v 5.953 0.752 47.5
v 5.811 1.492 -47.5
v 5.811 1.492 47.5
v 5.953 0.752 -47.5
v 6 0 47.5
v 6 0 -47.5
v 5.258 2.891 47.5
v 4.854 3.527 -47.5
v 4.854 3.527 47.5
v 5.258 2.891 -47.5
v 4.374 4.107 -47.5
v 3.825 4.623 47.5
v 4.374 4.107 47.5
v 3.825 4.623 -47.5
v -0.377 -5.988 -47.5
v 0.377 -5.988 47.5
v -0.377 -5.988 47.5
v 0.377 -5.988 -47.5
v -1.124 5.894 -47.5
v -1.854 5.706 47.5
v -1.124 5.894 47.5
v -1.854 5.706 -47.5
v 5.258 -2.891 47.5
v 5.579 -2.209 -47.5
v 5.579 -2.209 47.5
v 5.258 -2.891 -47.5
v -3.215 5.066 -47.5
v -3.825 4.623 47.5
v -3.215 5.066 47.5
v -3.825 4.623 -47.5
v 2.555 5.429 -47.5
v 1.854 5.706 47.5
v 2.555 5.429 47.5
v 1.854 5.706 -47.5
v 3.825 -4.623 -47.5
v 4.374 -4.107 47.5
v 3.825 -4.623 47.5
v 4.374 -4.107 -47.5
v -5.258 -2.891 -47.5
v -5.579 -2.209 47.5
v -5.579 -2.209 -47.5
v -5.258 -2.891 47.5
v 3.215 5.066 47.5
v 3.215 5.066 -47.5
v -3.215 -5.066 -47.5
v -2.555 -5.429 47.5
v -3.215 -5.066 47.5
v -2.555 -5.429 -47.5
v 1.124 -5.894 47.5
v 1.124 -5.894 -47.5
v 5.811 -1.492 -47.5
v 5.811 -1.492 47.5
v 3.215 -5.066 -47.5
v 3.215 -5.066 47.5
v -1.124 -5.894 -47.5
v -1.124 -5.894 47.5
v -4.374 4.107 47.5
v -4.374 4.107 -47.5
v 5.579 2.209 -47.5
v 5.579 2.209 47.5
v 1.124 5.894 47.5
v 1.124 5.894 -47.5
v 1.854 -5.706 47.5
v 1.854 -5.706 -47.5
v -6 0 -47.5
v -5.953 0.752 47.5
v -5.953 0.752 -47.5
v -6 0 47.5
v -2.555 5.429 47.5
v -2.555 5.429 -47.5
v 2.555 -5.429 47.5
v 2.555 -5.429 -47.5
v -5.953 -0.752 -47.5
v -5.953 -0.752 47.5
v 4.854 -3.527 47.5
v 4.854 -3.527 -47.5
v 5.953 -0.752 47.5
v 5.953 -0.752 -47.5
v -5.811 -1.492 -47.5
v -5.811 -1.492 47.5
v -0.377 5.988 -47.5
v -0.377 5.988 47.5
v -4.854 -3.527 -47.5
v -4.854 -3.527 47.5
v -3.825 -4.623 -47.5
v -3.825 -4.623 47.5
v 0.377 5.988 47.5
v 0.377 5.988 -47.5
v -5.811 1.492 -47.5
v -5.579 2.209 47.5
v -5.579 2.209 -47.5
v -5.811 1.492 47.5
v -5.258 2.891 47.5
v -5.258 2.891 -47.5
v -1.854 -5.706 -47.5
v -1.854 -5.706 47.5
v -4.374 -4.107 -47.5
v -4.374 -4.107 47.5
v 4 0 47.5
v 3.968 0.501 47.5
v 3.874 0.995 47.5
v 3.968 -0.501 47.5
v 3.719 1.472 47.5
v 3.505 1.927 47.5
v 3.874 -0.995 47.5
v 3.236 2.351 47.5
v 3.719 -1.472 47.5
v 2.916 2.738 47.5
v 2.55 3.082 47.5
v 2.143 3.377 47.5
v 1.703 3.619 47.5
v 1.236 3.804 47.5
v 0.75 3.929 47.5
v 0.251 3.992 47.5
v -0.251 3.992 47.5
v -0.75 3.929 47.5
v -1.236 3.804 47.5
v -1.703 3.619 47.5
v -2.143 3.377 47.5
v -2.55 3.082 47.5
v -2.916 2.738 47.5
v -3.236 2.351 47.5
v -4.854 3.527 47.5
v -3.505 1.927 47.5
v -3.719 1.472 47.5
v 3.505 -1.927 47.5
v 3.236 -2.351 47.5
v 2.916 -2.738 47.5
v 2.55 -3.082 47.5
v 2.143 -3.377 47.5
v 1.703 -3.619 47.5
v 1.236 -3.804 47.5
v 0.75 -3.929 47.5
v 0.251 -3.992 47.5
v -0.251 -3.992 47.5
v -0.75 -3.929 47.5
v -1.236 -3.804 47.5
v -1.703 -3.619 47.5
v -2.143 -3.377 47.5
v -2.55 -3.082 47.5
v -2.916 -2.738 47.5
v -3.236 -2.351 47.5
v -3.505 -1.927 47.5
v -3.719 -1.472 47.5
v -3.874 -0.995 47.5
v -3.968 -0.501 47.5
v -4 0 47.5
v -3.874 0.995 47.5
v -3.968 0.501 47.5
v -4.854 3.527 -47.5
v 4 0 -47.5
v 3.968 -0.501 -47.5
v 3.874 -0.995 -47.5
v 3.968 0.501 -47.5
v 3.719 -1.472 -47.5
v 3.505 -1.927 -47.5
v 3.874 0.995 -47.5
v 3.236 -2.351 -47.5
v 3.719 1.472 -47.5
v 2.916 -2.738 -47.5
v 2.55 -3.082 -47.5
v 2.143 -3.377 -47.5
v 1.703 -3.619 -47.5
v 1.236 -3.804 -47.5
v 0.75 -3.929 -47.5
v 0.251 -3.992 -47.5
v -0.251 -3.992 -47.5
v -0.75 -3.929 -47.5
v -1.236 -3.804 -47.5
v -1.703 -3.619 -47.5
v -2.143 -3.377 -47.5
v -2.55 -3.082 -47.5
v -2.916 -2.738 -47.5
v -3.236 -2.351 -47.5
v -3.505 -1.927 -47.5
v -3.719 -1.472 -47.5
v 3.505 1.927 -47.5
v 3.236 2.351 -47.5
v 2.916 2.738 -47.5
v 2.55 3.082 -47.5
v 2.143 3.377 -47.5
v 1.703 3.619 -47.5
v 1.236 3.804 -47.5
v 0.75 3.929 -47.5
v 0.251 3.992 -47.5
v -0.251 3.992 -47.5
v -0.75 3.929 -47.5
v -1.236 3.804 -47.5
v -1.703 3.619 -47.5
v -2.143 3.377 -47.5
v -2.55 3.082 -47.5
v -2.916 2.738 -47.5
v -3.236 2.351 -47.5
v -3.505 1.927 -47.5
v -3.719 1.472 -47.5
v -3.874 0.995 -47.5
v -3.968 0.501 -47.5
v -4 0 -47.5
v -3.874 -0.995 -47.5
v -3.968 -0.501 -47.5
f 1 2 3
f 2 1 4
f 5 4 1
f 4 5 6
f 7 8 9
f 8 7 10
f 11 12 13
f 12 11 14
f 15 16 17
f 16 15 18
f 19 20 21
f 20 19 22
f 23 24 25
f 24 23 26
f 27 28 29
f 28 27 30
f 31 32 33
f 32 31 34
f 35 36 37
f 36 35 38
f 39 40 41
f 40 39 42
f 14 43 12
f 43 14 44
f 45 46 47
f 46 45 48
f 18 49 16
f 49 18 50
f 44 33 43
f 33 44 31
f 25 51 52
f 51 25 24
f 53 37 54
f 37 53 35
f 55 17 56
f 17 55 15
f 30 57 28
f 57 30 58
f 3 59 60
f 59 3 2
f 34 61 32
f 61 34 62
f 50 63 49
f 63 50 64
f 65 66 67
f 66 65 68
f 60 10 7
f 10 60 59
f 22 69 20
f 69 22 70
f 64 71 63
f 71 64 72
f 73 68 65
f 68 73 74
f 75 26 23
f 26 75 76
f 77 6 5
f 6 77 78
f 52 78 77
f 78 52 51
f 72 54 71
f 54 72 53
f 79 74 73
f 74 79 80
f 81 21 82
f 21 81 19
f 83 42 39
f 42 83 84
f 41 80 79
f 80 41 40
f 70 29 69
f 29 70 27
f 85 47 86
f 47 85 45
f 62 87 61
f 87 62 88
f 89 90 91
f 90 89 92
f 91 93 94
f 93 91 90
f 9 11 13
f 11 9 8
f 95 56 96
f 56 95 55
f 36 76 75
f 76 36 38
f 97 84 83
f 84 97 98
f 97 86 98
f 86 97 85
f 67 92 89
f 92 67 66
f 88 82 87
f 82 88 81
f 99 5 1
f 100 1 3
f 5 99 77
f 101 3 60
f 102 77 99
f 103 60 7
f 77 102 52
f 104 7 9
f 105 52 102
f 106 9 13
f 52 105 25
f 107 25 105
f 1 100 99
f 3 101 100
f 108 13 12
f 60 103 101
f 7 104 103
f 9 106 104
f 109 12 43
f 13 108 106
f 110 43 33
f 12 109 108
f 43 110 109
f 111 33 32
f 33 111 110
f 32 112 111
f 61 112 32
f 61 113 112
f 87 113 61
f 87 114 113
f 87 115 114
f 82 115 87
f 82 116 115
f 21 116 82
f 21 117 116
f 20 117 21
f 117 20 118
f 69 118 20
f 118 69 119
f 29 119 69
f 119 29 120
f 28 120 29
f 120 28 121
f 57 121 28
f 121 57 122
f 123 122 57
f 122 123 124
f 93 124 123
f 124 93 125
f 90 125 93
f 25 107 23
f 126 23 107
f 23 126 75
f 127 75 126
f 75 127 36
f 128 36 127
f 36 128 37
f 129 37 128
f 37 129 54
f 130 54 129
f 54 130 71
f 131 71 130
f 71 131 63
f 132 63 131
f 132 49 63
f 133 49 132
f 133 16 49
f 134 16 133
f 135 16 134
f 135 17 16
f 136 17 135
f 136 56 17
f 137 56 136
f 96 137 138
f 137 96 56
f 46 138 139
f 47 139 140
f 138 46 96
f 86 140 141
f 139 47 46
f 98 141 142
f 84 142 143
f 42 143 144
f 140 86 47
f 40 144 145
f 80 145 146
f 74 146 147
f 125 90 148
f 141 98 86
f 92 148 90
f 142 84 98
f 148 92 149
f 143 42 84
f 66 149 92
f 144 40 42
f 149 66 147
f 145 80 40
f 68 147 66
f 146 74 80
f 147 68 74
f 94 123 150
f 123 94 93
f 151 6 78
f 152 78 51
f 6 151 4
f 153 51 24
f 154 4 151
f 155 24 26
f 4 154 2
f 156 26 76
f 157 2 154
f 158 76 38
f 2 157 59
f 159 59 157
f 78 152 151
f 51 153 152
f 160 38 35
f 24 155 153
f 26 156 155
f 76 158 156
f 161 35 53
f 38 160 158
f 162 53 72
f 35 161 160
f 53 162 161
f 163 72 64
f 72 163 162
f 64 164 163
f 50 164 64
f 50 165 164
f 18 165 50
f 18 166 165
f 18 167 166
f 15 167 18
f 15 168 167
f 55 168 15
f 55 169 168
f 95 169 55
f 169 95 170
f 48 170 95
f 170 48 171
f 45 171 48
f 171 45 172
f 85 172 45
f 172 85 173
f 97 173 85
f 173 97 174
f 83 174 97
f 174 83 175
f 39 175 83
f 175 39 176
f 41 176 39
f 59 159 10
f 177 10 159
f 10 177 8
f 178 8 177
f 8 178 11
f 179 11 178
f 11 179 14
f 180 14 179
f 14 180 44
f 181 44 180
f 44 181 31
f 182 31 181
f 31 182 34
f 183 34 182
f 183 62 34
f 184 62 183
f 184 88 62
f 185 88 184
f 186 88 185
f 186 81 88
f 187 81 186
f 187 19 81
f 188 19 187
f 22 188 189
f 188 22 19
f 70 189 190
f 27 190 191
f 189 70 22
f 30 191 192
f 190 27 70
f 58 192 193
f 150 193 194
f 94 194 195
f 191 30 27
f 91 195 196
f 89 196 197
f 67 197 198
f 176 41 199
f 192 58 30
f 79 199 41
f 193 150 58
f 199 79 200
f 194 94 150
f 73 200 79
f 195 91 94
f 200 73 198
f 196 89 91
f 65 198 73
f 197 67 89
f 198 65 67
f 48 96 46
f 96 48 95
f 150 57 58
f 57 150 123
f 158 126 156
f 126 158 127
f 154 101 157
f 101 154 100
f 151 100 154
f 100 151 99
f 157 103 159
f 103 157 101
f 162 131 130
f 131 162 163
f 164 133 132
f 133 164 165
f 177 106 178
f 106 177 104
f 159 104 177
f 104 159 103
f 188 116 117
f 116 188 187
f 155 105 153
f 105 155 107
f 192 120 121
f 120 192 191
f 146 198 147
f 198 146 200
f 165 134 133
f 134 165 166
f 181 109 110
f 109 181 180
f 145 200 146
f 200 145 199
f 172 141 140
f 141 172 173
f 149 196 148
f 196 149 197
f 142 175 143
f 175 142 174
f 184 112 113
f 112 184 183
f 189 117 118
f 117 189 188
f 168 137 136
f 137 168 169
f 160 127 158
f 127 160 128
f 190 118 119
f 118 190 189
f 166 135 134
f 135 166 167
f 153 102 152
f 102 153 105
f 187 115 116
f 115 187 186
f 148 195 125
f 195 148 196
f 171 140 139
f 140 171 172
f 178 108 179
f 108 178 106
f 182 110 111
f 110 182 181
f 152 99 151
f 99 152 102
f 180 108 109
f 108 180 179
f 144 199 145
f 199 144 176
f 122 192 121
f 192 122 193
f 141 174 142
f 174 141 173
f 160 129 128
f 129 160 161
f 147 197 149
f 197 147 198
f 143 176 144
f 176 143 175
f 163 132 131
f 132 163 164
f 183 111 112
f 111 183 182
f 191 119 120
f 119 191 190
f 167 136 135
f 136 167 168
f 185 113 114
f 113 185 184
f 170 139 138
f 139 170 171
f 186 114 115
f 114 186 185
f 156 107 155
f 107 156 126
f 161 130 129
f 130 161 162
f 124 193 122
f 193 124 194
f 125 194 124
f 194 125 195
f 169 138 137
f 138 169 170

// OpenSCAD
$fn = 50;


difference() {
	union() {
		translate(v = [0, 0, -47.5000000000]) {
			cylinder(h = 95, r = 6.0000000000);
		}
	}
	union() {
		translate(v = [0, 0, -100.0000000000]) {
			cylinder(h = 200, r = 4.0000000000);
		}
	}
}
